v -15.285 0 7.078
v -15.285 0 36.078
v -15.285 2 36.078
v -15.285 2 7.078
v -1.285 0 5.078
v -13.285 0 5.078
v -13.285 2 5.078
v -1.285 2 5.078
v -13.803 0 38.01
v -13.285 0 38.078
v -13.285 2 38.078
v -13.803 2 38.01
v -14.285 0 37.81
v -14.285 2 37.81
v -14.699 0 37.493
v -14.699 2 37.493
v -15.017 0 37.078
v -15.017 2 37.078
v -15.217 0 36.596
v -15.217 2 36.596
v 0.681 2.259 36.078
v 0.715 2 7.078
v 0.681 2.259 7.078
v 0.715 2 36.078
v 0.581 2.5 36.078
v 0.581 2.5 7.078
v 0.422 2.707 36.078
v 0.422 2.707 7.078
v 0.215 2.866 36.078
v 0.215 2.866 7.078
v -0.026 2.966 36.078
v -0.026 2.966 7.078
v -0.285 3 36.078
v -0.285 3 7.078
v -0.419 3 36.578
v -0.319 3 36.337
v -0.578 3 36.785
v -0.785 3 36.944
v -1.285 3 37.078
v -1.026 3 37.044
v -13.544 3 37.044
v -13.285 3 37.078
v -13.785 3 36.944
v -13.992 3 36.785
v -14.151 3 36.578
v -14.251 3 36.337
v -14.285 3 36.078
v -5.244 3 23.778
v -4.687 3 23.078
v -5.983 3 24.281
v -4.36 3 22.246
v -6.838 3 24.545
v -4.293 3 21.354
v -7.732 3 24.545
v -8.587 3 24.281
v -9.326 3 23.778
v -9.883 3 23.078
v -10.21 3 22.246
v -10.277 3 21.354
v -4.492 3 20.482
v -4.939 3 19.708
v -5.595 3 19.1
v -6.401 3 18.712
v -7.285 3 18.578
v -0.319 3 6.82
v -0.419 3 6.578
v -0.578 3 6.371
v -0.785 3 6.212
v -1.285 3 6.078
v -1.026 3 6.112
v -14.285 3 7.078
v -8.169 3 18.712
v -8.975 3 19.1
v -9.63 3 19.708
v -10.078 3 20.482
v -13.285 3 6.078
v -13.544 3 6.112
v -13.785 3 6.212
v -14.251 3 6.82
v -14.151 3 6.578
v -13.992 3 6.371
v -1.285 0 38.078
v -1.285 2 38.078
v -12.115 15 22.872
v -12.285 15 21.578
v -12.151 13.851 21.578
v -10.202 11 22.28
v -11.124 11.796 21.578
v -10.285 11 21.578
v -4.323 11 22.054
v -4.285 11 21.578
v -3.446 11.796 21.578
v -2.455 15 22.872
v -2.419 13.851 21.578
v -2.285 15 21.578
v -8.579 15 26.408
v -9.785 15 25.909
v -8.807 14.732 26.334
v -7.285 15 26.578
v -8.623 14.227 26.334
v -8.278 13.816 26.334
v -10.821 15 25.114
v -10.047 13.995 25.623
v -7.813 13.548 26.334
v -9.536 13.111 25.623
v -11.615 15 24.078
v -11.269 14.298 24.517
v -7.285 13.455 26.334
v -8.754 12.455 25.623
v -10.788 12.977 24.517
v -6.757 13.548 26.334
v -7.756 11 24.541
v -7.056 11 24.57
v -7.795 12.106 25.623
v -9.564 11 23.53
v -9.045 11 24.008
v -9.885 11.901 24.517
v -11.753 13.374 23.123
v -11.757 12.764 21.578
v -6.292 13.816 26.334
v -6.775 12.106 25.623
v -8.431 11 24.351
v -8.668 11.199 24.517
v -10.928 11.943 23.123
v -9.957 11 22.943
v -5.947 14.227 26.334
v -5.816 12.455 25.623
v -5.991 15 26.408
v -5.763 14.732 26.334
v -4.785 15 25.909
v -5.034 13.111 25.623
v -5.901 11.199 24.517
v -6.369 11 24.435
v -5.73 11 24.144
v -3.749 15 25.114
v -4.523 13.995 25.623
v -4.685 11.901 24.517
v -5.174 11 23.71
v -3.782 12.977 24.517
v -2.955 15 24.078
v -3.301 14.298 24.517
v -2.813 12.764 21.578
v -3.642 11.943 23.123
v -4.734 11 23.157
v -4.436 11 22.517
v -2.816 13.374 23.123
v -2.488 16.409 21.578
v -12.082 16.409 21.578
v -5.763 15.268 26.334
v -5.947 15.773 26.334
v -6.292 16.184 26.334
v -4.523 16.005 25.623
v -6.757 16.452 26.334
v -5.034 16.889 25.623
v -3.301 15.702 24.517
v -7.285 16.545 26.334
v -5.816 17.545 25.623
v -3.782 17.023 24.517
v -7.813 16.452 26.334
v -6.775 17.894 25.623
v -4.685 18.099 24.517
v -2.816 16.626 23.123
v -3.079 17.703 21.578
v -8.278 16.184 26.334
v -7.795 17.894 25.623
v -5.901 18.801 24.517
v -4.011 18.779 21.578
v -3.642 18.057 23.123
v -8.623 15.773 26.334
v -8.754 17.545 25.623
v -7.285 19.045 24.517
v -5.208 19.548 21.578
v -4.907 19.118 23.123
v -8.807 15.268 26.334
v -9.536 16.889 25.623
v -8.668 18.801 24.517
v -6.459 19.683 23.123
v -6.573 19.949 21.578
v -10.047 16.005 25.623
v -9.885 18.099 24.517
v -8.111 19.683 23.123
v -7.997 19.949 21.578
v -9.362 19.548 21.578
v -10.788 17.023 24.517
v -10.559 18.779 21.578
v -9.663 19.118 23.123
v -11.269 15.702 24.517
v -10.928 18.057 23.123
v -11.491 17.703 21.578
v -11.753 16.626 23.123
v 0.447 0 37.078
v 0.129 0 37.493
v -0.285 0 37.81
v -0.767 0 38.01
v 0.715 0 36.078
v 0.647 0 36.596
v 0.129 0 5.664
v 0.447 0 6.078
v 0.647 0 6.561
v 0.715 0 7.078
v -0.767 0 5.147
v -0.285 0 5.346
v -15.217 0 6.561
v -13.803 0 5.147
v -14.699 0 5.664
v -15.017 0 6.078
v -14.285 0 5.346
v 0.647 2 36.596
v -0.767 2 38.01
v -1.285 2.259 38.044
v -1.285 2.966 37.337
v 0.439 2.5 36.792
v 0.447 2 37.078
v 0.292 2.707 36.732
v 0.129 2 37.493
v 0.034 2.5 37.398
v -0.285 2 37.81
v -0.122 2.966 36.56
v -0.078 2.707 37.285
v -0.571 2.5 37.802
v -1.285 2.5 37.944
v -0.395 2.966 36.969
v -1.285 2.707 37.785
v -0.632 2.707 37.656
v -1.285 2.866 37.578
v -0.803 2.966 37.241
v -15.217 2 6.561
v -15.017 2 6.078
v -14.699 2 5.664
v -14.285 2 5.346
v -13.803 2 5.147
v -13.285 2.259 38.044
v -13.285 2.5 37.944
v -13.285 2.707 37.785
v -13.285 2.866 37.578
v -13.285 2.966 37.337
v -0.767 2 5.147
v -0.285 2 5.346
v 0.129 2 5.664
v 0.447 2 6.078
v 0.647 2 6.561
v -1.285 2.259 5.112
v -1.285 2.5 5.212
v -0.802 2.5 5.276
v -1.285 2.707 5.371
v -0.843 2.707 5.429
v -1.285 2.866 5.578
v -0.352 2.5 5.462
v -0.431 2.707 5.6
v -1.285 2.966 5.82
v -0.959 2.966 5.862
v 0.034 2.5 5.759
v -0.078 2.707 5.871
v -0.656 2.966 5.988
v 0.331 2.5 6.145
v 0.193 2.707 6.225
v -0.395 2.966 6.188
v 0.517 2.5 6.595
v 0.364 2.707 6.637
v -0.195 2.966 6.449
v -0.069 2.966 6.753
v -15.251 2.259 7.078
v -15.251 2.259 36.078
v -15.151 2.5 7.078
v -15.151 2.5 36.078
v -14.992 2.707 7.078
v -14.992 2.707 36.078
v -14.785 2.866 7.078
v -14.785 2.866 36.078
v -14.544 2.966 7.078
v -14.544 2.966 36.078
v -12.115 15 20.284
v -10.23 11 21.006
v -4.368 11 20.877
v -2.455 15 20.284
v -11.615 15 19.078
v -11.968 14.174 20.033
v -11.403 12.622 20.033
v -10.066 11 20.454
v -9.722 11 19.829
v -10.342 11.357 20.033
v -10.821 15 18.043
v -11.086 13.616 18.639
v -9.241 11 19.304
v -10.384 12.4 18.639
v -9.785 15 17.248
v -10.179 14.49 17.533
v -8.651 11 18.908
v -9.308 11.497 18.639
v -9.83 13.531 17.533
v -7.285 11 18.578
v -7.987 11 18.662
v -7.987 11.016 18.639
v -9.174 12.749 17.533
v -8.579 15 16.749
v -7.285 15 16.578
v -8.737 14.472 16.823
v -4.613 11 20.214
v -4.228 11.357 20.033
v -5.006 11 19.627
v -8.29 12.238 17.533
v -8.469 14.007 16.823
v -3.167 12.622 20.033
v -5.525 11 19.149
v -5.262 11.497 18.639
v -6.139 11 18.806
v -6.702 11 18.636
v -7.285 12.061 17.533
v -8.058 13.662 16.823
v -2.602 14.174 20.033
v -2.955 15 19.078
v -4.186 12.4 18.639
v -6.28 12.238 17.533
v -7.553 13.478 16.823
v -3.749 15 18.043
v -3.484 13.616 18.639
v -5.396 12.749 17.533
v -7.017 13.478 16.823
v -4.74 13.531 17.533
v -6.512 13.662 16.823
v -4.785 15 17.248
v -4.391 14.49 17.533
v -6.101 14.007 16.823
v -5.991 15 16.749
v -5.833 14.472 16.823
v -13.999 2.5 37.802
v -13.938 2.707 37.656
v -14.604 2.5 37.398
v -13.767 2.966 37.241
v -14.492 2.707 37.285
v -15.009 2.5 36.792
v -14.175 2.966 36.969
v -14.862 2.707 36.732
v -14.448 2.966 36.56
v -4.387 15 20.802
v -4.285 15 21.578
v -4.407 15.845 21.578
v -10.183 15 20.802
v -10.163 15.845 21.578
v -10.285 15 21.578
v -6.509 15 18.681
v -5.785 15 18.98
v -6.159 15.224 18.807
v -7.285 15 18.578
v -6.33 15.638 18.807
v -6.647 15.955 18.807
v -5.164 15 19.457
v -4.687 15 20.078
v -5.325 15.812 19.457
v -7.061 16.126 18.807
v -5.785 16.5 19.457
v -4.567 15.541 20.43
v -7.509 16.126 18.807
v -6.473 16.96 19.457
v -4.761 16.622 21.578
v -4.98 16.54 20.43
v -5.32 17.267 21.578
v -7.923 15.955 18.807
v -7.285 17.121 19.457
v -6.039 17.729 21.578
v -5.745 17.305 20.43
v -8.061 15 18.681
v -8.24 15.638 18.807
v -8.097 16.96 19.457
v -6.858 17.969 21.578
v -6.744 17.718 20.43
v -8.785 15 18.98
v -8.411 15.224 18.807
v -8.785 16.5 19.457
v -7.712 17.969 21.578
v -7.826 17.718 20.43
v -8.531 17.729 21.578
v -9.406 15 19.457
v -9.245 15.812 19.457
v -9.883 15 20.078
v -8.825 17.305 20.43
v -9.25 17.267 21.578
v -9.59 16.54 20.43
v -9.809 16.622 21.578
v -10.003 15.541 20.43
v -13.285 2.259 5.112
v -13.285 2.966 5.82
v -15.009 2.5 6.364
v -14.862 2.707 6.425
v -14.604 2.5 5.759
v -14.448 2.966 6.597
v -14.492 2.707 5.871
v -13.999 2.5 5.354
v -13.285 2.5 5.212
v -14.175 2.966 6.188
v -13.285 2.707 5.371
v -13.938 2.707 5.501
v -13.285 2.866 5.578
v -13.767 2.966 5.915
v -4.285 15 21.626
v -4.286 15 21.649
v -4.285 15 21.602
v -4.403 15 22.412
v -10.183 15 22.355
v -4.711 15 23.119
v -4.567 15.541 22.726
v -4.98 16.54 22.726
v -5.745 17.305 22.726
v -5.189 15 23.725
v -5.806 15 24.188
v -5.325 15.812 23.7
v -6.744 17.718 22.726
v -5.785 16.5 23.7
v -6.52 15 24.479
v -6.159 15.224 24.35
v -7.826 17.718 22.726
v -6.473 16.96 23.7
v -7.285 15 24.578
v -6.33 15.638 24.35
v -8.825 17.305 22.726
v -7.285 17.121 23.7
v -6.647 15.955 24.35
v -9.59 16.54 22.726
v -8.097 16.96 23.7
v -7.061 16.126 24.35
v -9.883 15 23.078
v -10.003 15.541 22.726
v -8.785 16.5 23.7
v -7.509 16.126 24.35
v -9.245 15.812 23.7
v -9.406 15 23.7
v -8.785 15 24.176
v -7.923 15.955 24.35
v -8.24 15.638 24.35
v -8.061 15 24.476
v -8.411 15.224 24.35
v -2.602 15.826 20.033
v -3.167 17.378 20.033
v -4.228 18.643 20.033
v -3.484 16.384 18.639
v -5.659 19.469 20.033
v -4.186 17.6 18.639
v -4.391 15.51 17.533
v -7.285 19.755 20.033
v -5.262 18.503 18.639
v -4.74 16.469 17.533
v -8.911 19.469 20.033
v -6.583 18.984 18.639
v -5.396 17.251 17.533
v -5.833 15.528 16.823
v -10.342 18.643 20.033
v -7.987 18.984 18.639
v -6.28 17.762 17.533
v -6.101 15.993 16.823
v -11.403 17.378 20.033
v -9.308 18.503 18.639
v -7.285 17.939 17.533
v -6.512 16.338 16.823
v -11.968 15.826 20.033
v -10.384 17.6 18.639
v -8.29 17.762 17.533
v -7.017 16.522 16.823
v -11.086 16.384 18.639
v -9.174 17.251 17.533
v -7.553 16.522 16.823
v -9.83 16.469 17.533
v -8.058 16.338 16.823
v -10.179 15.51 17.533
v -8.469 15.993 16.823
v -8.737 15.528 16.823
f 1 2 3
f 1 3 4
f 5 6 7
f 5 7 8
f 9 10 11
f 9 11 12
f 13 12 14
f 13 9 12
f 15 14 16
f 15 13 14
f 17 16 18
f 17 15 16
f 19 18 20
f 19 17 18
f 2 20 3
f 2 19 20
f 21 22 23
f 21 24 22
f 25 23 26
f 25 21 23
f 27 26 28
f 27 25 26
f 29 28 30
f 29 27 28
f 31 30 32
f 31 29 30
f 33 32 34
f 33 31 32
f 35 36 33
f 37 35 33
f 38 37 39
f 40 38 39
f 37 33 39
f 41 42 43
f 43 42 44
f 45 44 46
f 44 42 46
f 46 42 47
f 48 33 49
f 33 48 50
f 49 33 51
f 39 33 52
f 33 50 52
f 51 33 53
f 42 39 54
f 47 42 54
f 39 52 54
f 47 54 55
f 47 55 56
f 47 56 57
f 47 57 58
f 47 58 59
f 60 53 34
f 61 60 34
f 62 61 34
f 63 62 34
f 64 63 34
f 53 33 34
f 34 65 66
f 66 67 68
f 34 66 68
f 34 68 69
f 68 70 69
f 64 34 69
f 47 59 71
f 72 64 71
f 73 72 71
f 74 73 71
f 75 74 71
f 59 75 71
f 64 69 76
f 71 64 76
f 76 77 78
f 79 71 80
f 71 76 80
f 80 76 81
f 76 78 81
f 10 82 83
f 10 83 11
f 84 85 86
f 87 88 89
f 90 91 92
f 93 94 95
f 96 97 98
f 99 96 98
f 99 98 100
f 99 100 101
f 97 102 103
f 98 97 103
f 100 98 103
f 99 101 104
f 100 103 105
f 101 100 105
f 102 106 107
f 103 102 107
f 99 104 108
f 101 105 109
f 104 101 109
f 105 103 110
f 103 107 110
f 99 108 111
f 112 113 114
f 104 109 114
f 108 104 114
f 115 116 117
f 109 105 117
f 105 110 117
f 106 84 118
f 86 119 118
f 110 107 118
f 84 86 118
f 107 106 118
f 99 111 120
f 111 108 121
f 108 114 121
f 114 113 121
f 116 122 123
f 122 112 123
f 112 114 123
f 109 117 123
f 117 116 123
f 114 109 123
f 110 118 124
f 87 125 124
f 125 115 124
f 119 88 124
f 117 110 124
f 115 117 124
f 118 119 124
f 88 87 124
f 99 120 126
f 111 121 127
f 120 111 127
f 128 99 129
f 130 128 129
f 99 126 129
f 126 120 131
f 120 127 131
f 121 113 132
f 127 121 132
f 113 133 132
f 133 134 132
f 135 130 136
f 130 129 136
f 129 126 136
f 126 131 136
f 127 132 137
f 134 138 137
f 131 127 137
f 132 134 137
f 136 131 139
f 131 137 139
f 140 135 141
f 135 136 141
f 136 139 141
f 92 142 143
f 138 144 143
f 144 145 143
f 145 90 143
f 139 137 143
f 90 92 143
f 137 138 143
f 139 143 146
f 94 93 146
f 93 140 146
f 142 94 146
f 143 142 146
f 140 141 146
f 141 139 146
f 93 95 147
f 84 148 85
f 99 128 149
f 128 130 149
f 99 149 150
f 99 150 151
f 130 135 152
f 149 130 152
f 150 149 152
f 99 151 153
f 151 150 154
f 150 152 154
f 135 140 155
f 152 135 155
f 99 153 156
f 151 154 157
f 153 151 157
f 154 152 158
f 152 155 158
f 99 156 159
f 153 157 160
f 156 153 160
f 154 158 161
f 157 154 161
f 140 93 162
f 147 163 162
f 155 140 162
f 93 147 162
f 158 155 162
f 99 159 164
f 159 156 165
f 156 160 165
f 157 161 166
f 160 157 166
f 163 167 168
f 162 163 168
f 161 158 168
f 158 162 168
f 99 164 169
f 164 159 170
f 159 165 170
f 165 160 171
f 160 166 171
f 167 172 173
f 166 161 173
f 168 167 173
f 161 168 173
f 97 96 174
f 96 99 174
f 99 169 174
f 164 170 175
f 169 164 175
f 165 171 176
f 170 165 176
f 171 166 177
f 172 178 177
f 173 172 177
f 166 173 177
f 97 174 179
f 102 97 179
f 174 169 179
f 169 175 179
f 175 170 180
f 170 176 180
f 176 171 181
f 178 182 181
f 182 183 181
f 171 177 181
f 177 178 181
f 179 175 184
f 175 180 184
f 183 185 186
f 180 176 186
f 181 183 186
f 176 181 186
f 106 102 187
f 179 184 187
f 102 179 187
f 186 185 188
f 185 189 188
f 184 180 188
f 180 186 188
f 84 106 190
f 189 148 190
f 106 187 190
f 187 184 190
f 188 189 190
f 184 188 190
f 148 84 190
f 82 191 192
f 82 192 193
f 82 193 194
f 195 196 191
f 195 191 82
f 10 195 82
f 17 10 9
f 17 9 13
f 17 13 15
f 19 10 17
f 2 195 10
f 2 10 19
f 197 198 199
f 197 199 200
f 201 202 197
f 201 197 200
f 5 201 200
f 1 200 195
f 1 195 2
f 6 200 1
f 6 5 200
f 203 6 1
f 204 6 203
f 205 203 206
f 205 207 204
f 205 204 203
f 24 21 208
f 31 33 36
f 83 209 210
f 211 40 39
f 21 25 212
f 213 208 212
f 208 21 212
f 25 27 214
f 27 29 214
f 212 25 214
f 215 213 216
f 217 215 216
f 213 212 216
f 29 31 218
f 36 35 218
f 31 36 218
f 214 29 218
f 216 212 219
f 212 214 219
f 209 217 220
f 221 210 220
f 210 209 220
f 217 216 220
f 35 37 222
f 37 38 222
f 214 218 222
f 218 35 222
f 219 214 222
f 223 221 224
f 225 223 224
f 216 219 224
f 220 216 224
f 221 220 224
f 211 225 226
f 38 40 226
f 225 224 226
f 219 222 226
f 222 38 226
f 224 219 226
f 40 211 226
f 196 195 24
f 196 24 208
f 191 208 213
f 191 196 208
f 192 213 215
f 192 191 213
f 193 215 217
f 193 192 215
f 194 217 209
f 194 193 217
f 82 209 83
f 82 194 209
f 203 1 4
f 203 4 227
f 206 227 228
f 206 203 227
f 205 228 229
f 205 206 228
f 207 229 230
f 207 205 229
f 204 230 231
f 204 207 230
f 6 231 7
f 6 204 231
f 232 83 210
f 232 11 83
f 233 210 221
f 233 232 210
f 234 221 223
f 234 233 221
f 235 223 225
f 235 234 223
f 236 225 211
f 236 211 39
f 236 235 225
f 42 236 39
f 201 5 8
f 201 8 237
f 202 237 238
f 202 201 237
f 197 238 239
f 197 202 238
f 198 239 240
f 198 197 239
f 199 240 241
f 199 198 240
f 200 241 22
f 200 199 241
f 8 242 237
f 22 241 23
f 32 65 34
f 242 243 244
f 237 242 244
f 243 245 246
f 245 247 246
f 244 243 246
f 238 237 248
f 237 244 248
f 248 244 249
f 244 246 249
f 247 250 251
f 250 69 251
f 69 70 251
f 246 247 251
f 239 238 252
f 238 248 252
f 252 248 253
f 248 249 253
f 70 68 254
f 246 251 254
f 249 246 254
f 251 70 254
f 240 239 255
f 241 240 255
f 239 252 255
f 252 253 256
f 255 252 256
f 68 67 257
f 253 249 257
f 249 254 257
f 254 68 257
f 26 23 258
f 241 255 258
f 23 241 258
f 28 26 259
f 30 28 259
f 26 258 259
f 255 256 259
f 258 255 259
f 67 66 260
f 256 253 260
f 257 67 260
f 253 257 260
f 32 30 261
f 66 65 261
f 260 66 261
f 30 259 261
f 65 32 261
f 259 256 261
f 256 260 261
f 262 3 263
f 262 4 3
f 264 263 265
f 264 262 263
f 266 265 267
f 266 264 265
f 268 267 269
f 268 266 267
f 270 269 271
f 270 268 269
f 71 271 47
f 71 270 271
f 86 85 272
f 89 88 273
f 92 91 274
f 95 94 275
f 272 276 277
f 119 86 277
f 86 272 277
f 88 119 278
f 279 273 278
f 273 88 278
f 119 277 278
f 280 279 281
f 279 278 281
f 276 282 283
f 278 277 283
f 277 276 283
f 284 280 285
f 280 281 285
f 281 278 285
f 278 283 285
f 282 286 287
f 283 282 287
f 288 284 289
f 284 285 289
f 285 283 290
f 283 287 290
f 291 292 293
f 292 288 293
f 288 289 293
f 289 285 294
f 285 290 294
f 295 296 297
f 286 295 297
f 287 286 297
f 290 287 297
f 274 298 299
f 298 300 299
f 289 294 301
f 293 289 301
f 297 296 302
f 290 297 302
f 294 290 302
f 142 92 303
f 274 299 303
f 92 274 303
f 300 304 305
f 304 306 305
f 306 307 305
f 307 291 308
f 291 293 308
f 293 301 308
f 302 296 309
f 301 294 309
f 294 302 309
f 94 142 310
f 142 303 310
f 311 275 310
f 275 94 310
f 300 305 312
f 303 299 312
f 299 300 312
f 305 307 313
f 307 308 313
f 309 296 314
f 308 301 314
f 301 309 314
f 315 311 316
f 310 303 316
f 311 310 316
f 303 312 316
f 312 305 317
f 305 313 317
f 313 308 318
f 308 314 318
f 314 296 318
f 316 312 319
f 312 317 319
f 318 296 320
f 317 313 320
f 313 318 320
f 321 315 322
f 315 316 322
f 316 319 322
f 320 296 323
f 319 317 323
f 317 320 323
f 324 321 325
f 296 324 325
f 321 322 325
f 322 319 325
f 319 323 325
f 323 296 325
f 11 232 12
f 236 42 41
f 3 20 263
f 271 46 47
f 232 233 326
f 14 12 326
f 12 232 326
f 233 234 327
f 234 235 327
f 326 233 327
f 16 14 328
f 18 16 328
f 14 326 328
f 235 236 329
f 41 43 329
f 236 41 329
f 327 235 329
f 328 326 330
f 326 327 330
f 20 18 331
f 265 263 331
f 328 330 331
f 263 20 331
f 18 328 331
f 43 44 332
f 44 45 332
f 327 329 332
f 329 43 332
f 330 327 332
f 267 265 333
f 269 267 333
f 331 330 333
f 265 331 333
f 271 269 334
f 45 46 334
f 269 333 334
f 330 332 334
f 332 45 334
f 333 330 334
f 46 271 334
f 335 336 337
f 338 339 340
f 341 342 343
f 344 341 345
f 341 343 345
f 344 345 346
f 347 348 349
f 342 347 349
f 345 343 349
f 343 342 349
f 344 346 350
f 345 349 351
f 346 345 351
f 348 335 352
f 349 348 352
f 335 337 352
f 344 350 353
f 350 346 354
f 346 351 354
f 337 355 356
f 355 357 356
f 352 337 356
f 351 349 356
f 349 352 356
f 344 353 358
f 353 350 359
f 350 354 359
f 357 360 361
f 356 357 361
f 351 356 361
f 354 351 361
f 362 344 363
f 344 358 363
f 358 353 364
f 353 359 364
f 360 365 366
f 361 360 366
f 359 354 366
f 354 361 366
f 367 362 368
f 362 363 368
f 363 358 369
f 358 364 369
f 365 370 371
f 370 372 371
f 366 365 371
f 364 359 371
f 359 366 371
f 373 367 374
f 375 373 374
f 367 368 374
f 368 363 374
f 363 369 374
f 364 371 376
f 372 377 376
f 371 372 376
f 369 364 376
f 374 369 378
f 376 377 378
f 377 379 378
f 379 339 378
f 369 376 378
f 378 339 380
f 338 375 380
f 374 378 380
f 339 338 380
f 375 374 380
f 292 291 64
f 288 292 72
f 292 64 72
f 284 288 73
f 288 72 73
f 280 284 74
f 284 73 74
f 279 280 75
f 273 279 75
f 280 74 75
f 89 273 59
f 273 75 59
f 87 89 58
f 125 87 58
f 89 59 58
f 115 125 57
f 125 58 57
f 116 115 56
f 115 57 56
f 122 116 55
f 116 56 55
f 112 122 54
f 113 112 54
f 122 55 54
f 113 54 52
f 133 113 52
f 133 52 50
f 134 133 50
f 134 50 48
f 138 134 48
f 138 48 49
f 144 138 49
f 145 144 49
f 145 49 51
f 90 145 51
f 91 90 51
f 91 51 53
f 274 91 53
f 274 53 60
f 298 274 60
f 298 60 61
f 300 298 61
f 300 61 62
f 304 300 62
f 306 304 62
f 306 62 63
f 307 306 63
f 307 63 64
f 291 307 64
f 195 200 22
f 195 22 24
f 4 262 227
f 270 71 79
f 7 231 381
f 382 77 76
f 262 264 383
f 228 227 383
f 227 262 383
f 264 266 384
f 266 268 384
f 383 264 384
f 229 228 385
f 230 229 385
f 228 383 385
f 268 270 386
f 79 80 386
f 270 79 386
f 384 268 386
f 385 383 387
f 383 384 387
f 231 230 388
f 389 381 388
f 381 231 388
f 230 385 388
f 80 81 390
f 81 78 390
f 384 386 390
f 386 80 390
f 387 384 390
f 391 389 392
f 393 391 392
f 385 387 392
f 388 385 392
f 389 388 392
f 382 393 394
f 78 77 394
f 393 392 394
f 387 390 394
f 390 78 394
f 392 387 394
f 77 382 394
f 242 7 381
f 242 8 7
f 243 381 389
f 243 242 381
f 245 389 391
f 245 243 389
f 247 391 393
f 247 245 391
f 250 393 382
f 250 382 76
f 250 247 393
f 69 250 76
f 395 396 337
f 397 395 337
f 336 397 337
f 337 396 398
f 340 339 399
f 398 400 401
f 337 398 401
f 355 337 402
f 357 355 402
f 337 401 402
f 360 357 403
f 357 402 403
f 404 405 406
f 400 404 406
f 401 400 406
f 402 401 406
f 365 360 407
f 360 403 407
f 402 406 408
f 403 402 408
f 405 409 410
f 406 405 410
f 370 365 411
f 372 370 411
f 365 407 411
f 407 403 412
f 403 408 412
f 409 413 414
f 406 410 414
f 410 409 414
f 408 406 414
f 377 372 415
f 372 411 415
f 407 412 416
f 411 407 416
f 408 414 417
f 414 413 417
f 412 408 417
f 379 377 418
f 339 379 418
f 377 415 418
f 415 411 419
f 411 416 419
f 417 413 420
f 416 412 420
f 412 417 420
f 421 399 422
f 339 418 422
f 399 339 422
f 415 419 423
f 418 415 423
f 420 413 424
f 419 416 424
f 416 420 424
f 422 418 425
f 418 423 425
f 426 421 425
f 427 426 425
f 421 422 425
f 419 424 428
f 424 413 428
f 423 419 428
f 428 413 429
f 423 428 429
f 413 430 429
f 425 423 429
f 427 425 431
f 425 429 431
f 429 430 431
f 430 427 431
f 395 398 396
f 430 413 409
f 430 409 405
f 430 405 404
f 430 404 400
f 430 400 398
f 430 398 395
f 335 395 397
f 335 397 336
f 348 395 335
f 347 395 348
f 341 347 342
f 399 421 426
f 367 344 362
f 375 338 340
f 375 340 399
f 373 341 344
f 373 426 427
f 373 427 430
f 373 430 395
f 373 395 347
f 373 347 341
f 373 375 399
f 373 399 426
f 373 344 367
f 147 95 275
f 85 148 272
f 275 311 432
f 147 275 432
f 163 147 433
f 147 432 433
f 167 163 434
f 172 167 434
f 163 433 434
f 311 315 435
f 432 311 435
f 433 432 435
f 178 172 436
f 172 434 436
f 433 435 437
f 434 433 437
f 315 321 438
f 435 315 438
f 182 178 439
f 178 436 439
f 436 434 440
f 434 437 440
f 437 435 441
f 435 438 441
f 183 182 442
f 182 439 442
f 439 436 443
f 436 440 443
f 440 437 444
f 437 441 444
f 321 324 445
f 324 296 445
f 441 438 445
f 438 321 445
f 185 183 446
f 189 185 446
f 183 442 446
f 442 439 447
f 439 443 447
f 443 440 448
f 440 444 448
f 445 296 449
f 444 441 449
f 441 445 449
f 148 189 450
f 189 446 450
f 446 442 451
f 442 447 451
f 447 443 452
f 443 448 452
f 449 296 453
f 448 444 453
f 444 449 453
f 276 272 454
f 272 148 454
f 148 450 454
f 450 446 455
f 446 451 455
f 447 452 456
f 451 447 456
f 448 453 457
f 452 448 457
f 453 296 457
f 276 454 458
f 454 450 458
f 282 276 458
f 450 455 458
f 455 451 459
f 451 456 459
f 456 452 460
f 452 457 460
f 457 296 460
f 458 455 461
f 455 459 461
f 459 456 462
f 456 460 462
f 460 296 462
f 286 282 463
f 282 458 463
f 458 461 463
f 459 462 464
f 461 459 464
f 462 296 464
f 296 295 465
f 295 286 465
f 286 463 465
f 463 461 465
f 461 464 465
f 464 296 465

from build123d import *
from build123d.topology import SkipClean

# Parameters (mm, degrees)
BOSS_EXTRUDE1_DEPTH = 3
FILLET1_R           = 1
SKETCH2_R           = 3
BOSS_EXTRUDE2_DEPTH = 12


with BuildPart() as part:
    # Sketch1 → Boss-Extrude1 (new body)
    with BuildSketch(Plane(origin=(0, 0, 0), x_dir=(1, 0, 0), z_dir=(0, 1, 0))):
        with BuildLine():
            Line((-13.284983977, -5.078381136), (-1.284983977, -5.078381136))
            ThreePointArc((-1.284983977, -5.078381136), (0.129229585, -5.664167574), (0.715016023, -7.078381136))
            Line((0.715016023, -7.078381136), (0.715016023, -36.078381136))
            ThreePointArc((0.715016023, -36.078381136), (0.129229585, -37.492594699), (-1.284983977, -38.078381136))
            Line((-1.284983977, -38.078381136), (-13.284983977, -38.078381136))
            ThreePointArc((-13.284983977, -38.078381136), (-14.69919754, -37.492594699), (-15.284983977, -36.078381136))
            Line((-15.284983977, -36.078381136), (-15.284983977, -7.078381136))
            ThreePointArc((-15.284983977, -7.078381136), (-14.69919754, -5.664167574), (-13.284983977, -5.078381136))
        make_face()
    extrude(amount=BOSS_EXTRUDE1_DEPTH)

    # Fillet1
    fillet1_edges = [part.edges().sort_by_distance(p)[0] for p in [
        (-14.69919754, 3, 5.664167574),
        (-15.284983977, 3, 21.578381136),
        (-14.69919754, 3, 37.492594699),
        (-7.284983977, 3, 38.078381136),
        (0.129229585, 3, 37.492594699),
        (0.715016023, 3, 21.578381136),
        (0.129229585, 3, 5.664167574),
        (-7.284983977, 3, 5.078381136),
    ]]
    fillet(fillet1_edges, radius=FILLET1_R)

    # Sketch2 → Boss-Extrude2 (add)
    with BuildSketch(Plane(origin=(0, 3, 0), x_dir=(1, 0, 0), z_dir=(0, 1, 0))):
        with Locations(Location((-7.284983977, -21.578381136, 0), (0, 0, 90))):
            Circle(SKETCH2_R)
    extrude(amount=BOSS_EXTRUDE2_DEPTH)

    # Sketch3 → Revolve9 (revolve)
    with SkipClean():  # the faces are left unmerged after this step: merging them gives an invalid solid
        with BuildSketch(Plane(origin=(0, 15, 0), x_dir=(1, 0, 0), z_dir=(0, 1, 0))):
            with BuildLine():
                ThreePointArc((-2.284983977, -21.578381136), (-3.749450071, -18.04284723), (-7.284983977, -16.578381136))
                Line((-7.284983977, -16.578381136), (-7.284983977, -18.578381136))
                ThreePointArc((-7.284983977, -18.578381136), (-5.163663634, -19.457060793), (-4.284983977, -21.578381136))
                ThreePointArc((-4.284983977, -21.578381136), (-5.163663634, -23.69970148), (-7.284983977, -24.578381136))
                Line((-7.284983977, -24.578381136), (-7.284983977, -26.578381136))
                ThreePointArc((-7.284983977, -26.578381136), (-3.749450071, -25.113915042), (-2.284983977, -21.578381136))
            make_face()
            with BuildLine():
                Line((-7.284983977, -18.578381136), (-7.284983977, -16.578381136))
                ThreePointArc((-7.284983977, -16.578381136), (-12.284983977, -21.578381136), (-7.284983977, -26.578381136))
                Line((-7.284983977, -26.578381136), (-7.284983977, -24.578381136))
                ThreePointArc((-7.284983977, -24.578381136), (-10.284983977, -21.578381136), (-7.284983977, -18.578381136))
            make_face()
        revolve(axis=Axis((-7.284983977, 15, 12.733179874), (0, 0, 1)))


solid = part.part
